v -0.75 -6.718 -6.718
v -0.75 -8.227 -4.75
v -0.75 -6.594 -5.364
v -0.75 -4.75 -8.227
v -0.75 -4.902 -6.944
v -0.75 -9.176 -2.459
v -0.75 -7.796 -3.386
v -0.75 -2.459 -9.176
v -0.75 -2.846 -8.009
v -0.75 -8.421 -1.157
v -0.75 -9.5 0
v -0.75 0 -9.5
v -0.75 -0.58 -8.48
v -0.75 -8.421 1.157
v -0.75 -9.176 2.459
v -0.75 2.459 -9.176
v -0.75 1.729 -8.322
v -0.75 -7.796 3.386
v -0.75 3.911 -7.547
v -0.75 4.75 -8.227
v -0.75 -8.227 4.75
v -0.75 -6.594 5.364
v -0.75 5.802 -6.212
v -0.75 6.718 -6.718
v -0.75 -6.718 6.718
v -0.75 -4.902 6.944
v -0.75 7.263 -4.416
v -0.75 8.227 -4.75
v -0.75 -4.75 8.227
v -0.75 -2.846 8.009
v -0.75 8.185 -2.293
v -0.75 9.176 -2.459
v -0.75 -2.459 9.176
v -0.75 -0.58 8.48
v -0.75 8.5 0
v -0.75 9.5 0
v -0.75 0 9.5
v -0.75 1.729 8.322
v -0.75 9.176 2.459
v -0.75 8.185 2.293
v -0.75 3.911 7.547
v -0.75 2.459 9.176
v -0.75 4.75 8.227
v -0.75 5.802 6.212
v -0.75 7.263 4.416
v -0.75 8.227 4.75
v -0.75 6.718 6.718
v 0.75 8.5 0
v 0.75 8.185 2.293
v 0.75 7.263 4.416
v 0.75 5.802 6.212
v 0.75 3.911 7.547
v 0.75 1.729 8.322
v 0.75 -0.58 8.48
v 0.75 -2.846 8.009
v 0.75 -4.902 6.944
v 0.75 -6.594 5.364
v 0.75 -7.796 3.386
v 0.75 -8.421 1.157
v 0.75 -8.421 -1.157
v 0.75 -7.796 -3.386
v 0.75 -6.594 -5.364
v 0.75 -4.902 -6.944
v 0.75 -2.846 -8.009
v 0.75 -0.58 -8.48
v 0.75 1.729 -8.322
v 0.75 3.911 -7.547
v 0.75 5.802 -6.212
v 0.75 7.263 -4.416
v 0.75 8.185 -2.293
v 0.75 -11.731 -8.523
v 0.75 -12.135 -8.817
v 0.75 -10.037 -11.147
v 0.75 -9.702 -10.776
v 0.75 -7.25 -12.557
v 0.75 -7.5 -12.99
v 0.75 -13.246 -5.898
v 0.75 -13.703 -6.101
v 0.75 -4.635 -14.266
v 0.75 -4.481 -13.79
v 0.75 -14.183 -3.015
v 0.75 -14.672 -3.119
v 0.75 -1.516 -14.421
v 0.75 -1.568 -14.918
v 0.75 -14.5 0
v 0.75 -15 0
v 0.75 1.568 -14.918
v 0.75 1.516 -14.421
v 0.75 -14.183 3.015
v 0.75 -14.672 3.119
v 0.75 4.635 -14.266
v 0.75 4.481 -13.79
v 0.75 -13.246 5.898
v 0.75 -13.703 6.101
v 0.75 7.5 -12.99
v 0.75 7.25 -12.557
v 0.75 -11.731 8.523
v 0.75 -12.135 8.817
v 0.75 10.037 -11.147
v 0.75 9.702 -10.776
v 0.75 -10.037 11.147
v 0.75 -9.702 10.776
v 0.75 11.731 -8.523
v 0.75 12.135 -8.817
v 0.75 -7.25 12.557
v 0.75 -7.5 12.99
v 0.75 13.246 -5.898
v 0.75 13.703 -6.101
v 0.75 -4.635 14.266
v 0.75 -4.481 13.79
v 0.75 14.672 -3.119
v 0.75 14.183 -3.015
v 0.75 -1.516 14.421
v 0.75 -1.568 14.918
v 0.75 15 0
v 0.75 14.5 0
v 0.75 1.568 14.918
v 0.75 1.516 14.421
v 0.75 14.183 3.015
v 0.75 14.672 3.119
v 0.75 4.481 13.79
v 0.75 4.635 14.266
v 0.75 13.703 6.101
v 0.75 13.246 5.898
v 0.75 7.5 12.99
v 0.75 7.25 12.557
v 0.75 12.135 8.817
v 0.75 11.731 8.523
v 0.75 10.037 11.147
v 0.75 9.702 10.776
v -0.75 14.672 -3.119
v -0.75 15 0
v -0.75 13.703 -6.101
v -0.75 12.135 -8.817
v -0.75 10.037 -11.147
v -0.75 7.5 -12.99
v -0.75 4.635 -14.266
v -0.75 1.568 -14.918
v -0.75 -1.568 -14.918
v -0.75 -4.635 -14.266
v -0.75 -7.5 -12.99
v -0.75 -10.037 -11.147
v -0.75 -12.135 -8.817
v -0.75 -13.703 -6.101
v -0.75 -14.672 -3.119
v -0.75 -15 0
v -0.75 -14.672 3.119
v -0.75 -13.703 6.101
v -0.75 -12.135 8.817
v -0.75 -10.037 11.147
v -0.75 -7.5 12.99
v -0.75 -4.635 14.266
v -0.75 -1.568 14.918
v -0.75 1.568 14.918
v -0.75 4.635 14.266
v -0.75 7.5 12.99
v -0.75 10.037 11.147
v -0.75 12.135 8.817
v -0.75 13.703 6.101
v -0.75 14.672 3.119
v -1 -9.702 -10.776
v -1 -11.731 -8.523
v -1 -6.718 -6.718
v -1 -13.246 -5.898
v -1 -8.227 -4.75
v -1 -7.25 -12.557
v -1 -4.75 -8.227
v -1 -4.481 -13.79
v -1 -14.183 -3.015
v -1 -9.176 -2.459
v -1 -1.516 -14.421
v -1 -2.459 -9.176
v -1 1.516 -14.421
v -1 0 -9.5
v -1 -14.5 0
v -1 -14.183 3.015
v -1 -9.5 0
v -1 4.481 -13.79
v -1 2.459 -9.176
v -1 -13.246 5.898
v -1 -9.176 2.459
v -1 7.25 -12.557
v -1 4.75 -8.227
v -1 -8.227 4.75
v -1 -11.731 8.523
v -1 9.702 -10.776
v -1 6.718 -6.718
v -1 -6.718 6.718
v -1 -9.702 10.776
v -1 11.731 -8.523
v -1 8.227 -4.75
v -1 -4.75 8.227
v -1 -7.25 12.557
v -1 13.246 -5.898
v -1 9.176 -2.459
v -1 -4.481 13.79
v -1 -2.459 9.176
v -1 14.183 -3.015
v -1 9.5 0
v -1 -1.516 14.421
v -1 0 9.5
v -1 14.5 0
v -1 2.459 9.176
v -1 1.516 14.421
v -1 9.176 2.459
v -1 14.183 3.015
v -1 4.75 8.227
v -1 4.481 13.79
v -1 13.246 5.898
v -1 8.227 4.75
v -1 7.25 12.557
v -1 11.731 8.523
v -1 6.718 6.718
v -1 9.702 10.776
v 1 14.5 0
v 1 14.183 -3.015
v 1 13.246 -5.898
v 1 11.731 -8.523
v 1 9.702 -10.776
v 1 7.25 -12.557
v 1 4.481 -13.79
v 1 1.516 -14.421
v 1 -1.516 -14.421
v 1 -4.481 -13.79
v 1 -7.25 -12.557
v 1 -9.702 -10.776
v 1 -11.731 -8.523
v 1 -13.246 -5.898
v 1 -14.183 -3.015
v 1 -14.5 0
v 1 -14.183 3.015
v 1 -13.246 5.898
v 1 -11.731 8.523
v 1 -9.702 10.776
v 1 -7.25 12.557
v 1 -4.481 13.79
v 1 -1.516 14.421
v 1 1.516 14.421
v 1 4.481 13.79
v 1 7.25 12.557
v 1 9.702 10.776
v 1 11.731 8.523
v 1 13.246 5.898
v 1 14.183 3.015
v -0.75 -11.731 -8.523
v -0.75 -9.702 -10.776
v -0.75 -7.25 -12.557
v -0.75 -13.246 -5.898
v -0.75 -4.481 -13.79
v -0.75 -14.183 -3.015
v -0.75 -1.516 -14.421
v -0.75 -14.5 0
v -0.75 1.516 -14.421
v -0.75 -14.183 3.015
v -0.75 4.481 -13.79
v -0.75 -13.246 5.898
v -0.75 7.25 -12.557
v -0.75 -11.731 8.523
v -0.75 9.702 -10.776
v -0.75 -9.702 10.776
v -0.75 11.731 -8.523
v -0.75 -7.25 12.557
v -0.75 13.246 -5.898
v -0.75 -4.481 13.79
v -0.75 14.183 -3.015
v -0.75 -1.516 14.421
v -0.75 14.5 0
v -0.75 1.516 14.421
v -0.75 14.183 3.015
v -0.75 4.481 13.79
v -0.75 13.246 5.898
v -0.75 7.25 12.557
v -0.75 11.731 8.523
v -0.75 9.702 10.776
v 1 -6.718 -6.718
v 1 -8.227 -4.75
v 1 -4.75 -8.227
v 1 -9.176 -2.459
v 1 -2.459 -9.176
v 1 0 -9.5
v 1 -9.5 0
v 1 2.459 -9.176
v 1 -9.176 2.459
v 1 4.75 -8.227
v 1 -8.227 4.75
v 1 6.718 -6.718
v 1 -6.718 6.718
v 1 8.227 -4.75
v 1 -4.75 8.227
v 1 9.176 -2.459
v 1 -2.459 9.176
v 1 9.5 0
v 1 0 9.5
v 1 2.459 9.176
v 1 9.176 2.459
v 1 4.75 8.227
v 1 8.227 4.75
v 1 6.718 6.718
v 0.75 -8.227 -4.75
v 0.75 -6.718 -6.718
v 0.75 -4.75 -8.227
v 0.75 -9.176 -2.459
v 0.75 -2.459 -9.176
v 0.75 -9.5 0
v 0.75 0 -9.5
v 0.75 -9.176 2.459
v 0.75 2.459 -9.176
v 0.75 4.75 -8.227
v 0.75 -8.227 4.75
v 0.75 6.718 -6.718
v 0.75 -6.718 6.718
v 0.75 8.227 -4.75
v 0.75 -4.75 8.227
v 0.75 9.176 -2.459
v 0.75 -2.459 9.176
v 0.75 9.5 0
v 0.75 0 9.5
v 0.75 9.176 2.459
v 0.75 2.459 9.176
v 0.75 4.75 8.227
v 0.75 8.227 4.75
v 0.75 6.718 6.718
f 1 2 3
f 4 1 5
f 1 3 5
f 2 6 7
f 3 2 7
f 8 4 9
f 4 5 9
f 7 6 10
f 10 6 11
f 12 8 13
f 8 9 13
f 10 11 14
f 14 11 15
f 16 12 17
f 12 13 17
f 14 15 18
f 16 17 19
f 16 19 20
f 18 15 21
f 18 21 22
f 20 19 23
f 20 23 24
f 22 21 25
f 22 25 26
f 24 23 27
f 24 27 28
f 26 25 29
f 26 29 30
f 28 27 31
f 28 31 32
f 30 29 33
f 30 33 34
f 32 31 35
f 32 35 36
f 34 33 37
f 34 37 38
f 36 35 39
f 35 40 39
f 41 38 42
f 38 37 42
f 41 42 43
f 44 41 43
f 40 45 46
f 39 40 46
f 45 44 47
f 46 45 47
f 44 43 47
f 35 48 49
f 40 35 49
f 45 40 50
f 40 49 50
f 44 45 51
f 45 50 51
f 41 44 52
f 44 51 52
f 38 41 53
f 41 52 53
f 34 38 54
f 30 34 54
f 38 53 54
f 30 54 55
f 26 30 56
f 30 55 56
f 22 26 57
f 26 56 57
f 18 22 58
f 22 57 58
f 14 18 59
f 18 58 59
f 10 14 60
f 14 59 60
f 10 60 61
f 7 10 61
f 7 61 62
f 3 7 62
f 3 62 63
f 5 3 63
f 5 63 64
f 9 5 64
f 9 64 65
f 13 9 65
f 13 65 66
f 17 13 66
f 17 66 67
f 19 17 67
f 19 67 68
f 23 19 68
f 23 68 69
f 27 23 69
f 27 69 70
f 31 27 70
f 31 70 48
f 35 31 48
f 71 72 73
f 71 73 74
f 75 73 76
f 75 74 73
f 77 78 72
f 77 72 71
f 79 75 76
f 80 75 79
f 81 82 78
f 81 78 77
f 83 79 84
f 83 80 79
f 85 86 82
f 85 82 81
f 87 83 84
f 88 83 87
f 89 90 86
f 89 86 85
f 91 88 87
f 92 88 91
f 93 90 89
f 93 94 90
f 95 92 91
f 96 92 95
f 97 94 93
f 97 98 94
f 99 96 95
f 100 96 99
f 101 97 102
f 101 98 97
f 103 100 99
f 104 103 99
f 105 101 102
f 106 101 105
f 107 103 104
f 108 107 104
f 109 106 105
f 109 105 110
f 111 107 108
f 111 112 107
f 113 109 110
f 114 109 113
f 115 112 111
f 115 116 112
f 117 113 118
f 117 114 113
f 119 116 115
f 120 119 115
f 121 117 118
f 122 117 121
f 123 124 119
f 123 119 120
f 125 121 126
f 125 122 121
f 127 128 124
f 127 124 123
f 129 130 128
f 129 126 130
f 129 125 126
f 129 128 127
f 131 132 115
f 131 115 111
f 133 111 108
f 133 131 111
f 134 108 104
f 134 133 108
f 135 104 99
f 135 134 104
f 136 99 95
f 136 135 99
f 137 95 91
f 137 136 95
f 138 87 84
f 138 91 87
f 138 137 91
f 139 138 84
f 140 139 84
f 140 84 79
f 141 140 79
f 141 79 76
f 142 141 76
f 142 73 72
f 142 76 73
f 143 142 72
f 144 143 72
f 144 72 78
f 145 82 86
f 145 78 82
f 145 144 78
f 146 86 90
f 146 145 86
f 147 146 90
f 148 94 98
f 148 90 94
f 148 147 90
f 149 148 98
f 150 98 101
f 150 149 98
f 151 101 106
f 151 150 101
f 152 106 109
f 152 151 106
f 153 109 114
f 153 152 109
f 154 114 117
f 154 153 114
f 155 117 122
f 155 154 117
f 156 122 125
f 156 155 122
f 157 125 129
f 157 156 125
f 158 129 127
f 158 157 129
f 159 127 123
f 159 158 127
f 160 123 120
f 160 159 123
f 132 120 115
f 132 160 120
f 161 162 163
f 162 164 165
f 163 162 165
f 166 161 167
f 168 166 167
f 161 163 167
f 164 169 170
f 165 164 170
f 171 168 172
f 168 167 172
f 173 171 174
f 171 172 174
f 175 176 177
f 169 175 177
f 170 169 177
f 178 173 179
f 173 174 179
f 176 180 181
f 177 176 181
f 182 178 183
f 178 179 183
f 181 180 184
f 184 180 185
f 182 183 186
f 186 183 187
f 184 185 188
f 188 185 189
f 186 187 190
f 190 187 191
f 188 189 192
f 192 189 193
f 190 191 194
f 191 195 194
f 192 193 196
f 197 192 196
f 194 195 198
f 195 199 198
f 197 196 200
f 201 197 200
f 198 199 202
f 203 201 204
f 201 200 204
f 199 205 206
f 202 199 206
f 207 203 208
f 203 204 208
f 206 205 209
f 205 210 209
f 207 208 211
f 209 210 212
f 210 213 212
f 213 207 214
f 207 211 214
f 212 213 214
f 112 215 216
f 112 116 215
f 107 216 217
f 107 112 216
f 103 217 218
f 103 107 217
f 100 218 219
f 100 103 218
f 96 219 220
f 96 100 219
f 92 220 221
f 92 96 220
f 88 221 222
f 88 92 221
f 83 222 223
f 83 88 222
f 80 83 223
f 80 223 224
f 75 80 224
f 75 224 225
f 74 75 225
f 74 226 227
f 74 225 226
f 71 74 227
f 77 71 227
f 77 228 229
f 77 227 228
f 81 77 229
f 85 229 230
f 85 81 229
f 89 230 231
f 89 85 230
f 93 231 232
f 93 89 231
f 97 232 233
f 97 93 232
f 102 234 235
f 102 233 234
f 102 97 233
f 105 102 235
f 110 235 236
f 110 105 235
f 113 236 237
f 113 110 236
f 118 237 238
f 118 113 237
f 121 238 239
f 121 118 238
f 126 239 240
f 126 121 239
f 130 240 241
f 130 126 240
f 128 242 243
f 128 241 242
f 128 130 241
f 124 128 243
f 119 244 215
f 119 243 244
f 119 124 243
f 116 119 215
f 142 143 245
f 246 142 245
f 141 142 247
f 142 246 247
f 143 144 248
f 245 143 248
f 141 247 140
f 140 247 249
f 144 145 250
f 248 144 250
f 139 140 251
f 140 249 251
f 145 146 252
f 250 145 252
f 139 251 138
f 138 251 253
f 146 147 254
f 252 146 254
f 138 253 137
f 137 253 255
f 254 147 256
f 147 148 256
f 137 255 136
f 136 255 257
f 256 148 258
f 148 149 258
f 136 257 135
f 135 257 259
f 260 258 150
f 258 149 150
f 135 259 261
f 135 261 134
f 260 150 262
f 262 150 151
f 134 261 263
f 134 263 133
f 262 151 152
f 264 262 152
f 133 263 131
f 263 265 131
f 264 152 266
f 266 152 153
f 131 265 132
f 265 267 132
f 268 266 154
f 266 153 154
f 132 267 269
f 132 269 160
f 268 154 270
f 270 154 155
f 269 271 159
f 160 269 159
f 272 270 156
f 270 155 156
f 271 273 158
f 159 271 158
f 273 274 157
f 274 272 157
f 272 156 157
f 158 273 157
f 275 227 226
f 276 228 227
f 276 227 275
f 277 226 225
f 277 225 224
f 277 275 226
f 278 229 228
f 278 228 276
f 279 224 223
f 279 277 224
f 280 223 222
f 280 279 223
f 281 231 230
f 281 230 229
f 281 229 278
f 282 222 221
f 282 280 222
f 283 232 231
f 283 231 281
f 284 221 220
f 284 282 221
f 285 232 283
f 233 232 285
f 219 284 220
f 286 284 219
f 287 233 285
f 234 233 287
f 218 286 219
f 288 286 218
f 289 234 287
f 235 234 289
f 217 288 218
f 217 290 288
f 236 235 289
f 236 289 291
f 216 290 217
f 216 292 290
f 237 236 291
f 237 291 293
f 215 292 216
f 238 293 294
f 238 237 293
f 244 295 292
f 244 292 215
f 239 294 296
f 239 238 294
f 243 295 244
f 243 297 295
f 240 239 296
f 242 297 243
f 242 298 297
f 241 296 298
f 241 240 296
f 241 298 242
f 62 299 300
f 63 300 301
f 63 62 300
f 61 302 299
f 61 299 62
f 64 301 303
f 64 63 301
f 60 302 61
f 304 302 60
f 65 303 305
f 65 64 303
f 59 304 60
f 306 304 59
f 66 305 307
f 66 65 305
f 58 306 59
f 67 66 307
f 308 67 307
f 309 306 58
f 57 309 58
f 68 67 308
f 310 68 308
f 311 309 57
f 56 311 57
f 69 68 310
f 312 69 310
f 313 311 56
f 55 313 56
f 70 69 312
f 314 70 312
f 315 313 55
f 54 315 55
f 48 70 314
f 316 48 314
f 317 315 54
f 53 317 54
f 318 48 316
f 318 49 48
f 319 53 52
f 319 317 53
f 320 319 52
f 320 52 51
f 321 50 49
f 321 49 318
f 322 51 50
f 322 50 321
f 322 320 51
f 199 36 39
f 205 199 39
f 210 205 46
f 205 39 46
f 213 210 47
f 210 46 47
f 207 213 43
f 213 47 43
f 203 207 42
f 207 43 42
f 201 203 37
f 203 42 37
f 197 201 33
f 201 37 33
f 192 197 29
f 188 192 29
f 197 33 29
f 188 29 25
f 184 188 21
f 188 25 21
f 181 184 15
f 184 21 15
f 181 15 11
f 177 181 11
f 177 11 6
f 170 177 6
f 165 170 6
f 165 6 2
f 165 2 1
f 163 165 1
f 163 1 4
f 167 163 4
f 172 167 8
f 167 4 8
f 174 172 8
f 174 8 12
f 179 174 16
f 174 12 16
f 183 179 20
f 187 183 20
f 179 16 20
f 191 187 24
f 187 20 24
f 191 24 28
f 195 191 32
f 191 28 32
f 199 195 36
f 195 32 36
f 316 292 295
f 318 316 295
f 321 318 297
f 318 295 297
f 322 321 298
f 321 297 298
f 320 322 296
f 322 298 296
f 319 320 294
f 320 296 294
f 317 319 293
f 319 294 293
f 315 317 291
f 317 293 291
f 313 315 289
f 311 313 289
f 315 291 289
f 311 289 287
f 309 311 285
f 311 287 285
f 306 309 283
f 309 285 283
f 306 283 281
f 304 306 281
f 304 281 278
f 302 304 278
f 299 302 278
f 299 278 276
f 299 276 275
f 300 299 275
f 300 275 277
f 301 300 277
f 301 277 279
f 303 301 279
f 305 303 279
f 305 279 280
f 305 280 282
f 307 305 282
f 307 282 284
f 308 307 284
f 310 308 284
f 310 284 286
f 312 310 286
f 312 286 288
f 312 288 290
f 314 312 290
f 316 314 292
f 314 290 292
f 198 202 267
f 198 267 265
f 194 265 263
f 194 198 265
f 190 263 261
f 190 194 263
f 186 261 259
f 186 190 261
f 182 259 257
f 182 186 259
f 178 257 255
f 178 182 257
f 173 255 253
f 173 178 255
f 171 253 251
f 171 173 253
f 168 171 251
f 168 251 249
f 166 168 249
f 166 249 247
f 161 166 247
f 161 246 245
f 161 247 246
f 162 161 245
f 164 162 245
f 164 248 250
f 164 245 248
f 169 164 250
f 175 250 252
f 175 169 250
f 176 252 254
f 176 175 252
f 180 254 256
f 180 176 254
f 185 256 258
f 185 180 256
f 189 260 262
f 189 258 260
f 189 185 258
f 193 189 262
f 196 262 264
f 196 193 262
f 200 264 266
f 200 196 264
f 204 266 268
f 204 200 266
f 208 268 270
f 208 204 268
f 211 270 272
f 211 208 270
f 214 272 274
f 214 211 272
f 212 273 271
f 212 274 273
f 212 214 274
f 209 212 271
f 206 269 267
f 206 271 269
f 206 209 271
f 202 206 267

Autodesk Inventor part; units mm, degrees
sketch "Sketch_1" plane through (0, 0, 0) normal (0, 0, 1) x (1, 0, 0)
  line L0 (50, 0) -> (-50, 0)
  line L1 (-1, 9.5) -> (-0.75, 9.5)
  line L2 (-0.75, 9.5) -> (-0.75, 8.5)
  line L3 (-0.75, 8.5) -> (0.75, 8.5)
  line L4 (0.75, 8.5) -> (0.75, 9.5)
  line L5 (0.75, 9.5) -> (1, 9.5)
  line L6 (1, 9.5) -> (1, 14.5)
  line L7 (1, 14.5) -> (0.75, 14.5)
  line L8 (0.75, 14.5) -> (0.75, 15)
  line L9 (0.75, 15) -> (-0.75, 15)
  line L10 (-0.75, 15) -> (-0.75, 14.5)
  line L11 (-0.75, 14.5) -> (-1, 14.5)
  line L12 (-1, 14.5) -> (-1, 9.5)
revolve "Revolution1" add sketch "Sketch_1" angle 360 about axis through (50, 0, 0) along (1, 0, 0)
ref_plane "core_to_washer_XY" through (0, 0, 0) normal (1, 0, 0) x (0, 0, -1)
ref_plane "core_to_washer_YZ" through (0, 0, 0) normal (0, 0, -1) x (0, 1, 0)
ref_plane "core_to_washer_ZX" through (0, 0, 0) normal (0, 1, 0) x (1, 0, 0)
ref_plane "core_to_washer1_XY" through (0, 0, 0) normal (-1, 0, 0) x (0, 0, -1)
ref_plane "core_to_washer1_YZ" through (0, 0, 0) normal (0, 0, -1) x (0, -1, 0)
ref_plane "core_to_washer1_ZX" through (0, 0, 0) normal (0, -1, 0) x (-1, 0, 0)
properties part number "core_BA1730"
